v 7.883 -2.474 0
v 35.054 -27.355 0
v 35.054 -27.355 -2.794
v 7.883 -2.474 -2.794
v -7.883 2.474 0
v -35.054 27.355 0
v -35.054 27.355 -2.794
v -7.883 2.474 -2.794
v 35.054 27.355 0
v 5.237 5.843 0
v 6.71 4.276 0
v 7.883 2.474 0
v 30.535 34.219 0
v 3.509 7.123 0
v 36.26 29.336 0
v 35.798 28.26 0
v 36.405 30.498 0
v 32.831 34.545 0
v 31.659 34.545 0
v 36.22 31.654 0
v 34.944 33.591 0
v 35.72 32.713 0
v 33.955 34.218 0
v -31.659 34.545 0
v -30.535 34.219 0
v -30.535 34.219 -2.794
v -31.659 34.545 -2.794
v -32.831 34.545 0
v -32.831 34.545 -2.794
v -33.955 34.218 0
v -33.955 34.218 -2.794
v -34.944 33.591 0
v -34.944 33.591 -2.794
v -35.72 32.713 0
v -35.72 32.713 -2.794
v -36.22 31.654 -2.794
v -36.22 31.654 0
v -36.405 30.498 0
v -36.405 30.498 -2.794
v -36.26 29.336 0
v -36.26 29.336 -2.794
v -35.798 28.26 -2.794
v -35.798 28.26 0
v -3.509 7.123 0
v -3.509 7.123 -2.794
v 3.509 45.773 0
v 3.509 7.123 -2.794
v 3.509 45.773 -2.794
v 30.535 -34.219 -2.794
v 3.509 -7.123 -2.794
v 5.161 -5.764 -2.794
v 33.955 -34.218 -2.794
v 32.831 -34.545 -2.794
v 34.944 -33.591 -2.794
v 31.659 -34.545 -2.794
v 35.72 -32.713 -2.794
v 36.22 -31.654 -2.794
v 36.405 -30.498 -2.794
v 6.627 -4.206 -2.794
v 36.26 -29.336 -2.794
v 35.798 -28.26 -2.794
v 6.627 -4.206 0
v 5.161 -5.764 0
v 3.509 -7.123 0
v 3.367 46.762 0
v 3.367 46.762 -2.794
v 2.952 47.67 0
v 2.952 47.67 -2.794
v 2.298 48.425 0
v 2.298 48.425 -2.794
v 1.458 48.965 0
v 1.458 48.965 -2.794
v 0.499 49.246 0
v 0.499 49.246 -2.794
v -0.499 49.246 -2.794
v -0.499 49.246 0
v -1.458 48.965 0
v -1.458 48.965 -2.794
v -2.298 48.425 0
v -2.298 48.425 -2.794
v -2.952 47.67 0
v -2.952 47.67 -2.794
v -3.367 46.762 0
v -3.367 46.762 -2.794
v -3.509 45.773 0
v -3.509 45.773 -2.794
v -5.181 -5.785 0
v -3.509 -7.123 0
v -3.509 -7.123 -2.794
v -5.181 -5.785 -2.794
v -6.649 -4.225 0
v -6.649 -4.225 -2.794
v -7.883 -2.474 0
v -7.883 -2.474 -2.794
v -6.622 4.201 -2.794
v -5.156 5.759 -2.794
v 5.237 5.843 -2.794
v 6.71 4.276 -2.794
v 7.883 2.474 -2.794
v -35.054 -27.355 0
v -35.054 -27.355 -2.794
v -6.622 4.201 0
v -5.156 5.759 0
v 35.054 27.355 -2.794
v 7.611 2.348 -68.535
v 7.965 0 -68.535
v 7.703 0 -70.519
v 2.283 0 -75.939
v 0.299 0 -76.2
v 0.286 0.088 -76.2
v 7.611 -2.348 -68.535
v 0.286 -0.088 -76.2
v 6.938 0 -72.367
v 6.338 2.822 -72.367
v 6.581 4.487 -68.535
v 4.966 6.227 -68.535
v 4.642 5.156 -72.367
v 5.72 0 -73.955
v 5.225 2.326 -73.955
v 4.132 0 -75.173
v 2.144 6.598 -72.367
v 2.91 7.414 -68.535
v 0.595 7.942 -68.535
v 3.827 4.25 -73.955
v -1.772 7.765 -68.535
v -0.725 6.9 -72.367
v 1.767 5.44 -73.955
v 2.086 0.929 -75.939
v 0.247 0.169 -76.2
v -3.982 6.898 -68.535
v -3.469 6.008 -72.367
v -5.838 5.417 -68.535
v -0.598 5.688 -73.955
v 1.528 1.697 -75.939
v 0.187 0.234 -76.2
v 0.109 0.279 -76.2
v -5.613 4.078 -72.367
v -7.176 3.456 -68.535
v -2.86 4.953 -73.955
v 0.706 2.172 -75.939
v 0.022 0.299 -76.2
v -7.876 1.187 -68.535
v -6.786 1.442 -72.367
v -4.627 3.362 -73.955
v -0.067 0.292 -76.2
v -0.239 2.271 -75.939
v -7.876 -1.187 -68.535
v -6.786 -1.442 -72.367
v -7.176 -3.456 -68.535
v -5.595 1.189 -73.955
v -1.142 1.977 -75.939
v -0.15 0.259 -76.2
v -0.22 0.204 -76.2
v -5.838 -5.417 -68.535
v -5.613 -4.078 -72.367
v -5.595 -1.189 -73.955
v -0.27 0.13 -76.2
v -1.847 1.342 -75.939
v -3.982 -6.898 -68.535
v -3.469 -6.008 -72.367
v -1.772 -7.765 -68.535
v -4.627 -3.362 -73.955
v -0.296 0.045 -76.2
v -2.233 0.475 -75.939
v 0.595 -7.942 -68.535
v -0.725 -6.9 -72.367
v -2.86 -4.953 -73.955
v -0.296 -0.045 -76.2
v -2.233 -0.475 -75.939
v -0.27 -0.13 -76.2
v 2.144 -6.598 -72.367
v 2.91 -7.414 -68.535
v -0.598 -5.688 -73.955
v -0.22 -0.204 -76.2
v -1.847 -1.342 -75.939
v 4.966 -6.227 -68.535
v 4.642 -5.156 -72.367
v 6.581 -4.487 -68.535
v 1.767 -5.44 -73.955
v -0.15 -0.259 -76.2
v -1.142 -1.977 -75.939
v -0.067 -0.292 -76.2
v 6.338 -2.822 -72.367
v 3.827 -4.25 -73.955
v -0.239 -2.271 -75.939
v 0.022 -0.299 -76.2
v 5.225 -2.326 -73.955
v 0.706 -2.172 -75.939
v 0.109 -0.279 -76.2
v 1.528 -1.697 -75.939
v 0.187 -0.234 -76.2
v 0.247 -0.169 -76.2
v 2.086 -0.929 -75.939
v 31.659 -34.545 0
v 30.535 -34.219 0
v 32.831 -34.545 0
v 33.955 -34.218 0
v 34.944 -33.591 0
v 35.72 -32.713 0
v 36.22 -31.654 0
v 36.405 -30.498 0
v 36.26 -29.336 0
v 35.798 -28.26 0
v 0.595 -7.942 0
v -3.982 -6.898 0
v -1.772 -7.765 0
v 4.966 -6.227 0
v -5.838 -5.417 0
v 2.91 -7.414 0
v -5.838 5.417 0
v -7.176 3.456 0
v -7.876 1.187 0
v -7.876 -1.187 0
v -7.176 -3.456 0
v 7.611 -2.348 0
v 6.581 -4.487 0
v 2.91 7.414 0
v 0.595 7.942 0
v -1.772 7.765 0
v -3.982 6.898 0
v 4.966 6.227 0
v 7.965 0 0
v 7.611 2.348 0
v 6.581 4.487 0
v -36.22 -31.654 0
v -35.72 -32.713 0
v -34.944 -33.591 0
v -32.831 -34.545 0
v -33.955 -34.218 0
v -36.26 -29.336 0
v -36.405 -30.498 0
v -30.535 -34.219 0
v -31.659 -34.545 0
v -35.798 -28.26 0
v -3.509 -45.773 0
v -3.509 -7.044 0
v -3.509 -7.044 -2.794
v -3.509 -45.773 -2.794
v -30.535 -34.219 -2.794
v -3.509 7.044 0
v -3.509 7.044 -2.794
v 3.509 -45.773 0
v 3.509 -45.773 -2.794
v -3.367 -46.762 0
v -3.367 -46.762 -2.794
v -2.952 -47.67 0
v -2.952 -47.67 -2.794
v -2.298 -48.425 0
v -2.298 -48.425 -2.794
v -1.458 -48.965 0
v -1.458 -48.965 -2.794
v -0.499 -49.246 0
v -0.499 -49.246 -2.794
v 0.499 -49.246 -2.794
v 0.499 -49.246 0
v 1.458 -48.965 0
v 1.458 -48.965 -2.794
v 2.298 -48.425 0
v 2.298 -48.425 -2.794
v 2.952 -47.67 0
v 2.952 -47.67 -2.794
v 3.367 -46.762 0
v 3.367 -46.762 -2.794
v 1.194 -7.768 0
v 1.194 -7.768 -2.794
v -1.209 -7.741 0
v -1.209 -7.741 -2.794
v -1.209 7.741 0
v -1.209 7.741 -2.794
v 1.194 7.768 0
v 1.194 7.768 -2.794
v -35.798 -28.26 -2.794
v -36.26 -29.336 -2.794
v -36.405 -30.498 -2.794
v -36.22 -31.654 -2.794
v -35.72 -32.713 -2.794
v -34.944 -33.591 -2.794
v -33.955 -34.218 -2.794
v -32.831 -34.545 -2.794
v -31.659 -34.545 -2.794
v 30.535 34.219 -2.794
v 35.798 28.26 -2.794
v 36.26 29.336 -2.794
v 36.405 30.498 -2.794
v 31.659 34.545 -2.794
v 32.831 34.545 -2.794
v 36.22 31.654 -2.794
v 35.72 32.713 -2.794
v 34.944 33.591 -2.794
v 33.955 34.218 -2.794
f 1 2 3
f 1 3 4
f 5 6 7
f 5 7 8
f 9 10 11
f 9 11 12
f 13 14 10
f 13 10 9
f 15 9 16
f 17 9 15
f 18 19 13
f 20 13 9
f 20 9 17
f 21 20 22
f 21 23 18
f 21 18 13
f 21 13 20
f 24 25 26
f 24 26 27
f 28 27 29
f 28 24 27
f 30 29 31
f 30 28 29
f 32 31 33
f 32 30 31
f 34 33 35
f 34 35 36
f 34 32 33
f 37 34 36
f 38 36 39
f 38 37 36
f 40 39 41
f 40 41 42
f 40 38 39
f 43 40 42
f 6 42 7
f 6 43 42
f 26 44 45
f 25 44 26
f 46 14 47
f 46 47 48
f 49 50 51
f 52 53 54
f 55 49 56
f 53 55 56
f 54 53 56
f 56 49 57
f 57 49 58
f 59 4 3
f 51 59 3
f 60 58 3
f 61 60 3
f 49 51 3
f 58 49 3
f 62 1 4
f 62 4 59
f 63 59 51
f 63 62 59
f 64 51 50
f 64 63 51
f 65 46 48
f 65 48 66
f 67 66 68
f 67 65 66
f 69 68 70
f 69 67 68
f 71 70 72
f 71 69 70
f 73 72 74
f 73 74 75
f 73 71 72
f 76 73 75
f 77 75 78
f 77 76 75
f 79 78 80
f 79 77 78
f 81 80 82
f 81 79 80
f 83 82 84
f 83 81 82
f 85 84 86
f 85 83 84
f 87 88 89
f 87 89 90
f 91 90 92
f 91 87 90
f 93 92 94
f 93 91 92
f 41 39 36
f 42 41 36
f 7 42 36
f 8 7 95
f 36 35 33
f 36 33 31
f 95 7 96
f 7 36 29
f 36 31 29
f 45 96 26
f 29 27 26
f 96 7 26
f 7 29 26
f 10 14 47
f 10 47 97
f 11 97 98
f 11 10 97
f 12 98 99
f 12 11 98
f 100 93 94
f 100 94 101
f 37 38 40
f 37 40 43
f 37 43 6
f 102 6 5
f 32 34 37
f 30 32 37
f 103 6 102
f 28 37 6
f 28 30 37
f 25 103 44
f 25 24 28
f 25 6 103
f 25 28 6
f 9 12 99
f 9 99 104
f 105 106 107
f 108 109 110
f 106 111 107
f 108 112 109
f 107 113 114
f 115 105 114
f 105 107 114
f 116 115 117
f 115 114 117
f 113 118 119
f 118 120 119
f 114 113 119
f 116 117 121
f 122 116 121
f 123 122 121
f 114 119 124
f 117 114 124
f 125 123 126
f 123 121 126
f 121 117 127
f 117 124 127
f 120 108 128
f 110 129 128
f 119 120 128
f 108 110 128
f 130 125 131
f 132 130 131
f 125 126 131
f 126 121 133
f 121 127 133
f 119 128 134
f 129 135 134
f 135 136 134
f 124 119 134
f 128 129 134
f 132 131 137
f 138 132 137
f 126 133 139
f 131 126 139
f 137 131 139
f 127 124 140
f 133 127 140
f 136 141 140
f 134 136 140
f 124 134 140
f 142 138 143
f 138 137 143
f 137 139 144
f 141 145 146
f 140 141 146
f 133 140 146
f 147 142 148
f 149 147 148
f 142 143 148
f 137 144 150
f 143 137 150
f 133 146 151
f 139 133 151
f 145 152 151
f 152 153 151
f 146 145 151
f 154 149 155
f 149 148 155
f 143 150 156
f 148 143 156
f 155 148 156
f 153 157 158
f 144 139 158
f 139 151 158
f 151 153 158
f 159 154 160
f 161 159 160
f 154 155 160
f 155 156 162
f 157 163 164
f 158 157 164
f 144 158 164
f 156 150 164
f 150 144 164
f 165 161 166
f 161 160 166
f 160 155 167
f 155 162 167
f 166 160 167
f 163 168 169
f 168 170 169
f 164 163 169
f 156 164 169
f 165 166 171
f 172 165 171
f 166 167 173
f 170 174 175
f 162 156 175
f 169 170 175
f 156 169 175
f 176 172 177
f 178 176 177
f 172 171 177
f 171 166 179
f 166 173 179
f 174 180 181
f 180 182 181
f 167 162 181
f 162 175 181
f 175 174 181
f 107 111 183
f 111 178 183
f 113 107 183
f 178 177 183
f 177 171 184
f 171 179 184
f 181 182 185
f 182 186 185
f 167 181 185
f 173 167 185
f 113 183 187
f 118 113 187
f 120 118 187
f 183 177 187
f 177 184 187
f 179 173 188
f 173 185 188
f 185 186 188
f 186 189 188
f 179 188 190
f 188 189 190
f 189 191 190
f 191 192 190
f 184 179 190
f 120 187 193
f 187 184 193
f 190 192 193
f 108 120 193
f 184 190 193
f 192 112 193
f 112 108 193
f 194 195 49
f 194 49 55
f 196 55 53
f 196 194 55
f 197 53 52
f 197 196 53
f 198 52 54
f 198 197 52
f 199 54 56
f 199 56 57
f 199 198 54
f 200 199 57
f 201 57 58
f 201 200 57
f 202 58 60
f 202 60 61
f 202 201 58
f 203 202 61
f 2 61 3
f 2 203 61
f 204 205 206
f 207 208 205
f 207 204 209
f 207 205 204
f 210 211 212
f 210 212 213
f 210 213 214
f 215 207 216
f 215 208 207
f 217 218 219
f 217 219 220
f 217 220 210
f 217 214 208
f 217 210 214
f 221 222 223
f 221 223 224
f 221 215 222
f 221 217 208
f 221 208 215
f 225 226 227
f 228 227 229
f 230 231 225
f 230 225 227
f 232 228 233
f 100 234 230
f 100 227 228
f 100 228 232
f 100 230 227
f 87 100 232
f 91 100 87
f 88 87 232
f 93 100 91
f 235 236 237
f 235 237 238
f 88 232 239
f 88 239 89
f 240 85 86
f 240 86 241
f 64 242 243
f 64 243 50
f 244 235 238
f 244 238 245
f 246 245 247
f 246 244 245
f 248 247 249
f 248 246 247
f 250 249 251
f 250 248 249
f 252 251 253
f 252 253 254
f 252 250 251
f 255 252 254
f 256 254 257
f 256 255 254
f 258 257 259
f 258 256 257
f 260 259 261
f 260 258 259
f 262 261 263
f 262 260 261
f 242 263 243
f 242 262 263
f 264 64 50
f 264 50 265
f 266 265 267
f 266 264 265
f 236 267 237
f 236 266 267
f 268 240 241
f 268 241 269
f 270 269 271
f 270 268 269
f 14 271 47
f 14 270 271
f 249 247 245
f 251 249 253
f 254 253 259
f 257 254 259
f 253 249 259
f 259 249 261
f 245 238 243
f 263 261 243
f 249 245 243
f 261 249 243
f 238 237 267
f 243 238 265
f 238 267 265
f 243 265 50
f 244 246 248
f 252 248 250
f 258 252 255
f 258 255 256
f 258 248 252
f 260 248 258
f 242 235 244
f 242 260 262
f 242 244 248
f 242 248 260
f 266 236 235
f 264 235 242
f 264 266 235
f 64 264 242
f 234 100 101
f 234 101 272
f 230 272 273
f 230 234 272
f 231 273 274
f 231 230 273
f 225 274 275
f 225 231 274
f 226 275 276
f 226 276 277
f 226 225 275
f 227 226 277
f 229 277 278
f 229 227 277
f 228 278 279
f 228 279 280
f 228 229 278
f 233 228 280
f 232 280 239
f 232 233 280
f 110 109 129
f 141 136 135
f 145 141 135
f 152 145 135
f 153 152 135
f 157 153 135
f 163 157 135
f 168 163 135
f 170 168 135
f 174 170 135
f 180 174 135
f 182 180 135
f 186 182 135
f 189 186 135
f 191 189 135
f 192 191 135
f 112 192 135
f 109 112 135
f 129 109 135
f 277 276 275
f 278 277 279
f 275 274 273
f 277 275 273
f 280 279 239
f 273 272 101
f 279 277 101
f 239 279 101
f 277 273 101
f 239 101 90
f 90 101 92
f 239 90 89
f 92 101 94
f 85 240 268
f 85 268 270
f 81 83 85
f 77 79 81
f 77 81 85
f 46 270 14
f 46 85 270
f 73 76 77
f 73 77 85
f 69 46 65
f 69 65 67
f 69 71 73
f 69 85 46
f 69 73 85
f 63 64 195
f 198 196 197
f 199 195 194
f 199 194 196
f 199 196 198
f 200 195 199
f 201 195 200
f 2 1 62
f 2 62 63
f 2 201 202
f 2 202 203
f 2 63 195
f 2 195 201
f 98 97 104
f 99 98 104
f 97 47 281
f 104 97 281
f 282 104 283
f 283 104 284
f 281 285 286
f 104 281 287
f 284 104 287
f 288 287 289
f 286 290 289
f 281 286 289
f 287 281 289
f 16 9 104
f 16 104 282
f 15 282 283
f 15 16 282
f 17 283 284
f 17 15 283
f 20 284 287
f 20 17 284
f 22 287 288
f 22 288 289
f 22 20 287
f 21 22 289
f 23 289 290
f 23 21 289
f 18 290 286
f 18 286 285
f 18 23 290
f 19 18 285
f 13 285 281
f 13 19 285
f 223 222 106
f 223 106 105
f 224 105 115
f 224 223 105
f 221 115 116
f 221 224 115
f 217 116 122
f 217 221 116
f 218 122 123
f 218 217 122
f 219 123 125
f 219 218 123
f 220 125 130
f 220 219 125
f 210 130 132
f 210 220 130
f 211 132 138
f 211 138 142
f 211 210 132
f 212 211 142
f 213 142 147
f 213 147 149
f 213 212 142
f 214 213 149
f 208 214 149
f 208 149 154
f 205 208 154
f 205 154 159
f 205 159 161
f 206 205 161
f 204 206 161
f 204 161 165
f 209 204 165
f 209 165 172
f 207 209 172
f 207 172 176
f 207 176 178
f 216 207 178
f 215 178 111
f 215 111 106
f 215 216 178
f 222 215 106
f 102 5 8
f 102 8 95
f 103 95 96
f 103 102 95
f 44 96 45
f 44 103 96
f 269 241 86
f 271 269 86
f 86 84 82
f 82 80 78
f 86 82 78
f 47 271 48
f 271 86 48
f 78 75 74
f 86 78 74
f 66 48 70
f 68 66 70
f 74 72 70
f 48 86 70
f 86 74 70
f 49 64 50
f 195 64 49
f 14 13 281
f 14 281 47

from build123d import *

# Parameters (mm, degrees)
F0_R     = 7.9646104271
F1_DEPTH = 76.2
F3_DEPTH = 1.27
F4_DEPTH = 2.794
F5_R     = 7.6651280605


with BuildPart() as f1:
    # F0 (on Top) → F1 (new body)
    with BuildSketch(Plane.XY):
        Circle(F0_R)
    extrude(amount=-F1_DEPTH)

    # F5
    f5_edges = [f1.edges().sort_by_distance(p)[0] for p in [
        (-7.96461, 0, -76.2),
    ]]
    fillet(f5_edges, radius=F5_R)


with BuildPart() as f3:
    # F2 (on Top) → F3 (new body)
    with BuildSketch(Plane.XY):
        with BuildLine():
            Line((-3.5088843636, 7.1228999505), (-3.5088843636, 7.0438587708))
            ThreePointArc((-3.5088843636, 7.0438587708), (-0.0085166469, 7.8395403691), (3.5088843636, 7.1228999505))
            Line((3.5088843636, 7.1228999505), (3.5088843636, 45.7731597126))
            ThreePointArc((3.5088843636, 45.7731597126), (0, 49.2820440761), (-3.5088843636, 45.7731597126))
            Line((-3.5088843636, 45.7731597126), (-3.5088843636, 7.1228999505))
        make_face()
    extrude(amount=-F3_DEPTH)

    # F2 (on Top) → F4, piece 3 (join)
    with BuildSketch(Plane.XY):
        with BuildLine():
            Line((-3.5088843636, 7.1228999505), (-3.5088843636, 7.0438587708))
            ThreePointArc((-3.5088843636, 7.0438587708), (-0.0085166469, 7.8395403691), (3.5088843636, 7.1228999505))
            Line((3.5088843636, 7.1228999505), (3.5088843636, 45.7731597126))
            ThreePointArc((3.5088843636, 45.7731597126), (0, 49.2820440761), (-3.5088843636, 45.7731597126))
            Line((-3.5088843636, 45.7731597126), (-3.5088843636, 7.1228999505))
        make_face()
    extrude(amount=-F4_DEPTH)


with BuildPart() as f4:
    # F2 (on Top) → F4 (new body)
    with BuildSketch(Plane.XY):
        with BuildLine():
            ThreePointArc((-7.8832879663, 2.4740586523), (-5.9135126334, 5.0030703093), (-3.5088843636, 7.1228999505))
            Line((-3.5088843636, 7.1228999505), (-30.534560875, 34.2191336145))
            ThreePointArc((-30.534560875, 34.2191336145), (-35.7195475655, 32.7132669375), (-35.0542927591, 27.3551742292))
            Line((-35.0542927591, 27.3551742292), (-7.8832879663, 2.4740586523))
        make_face()
    extrude(amount=-F4_DEPTH)


with BuildPart() as f4b:
    # F2 (on Top) → F4, piece 2 (new body)
    with BuildSketch(Plane.XY):
        with BuildLine():
            Line((30.534560875, 34.2191336145), (3.5088843636, 7.1228999505))
            ThreePointArc((3.5088843636, 7.1228999505), (6.0083363832, 5.0922962748), (7.8832879663, 2.4740586523))
            Line((7.8832879663, 2.4740586523), (35.0542927591, 27.3551742292))
            ThreePointArc((35.0542927591, 27.3551742292), (35.7195475655, 32.7132669375), (30.534560875, 34.2191336145))
        make_face()
    extrude(amount=-F4_DEPTH)


with BuildPart() as f4c:
    # F2 (on Top) → F4, piece 4 (new body)
    with BuildSketch(Plane.XY):
        with BuildLine():
            ThreePointArc((3.5088843636, -7.1228999505), (-0.0085166469, -7.8395403691), (-3.5088843636, -7.0438587708))
            Line((-3.5088843636, -7.0438587708), (-3.5088843636, -7.1228999505))
            Line((-3.5088843636, -7.1228999505), (-3.5088843636, -45.7731597126))
            ThreePointArc((-3.5088843636, -45.7731597126), (0, -49.2820440761), (3.5088843636, -45.7731597126))
            Line((3.5088843636, -45.7731597126), (3.5088843636, -7.1228999505))
        make_face()
    extrude(amount=-F4_DEPTH)


with BuildPart() as f4d:
    # F2 (on Top) → F4, piece 5 (new body)
    with BuildSketch(Plane.XY):
        with BuildLine():
            ThreePointArc((7.8832879663, -2.4740586523), (5.9191100309, -5.0083372725), (3.5088843636, -7.1228999505))
            Line((3.5088843636, -7.1228999505), (30.534560875, -34.2191336145))
            ThreePointArc((30.534560875, -34.2191336145), (35.7195475655, -32.7132669375), (35.0542927591, -27.3551742292))
            Line((35.0542927591, -27.3551742292), (7.8832879663, -2.4740586523))
        make_face()
    extrude(amount=-F4_DEPTH)


with BuildPart() as f4e:
    # F2 (on Top) → F4, piece 6 (new body)
    with BuildSketch(Plane.XY):
        with BuildLine():
            Line((-30.534560875, -34.2191336145), (-3.5088843636, -7.1228999505))
            ThreePointArc((-3.5088843636, -7.1228999505), (-5.9425805218, -5.0304222166), (-7.8832879663, -2.4740586523))
            Line((-7.8832879663, -2.4740586523), (-35.0542927591, -27.3551742292))
            ThreePointArc((-35.0542927591, -27.3551742292), (-35.7195475655, -32.7132669375), (-30.534560875, -34.2191336145))
        make_face()
    extrude(amount=-F4_DEPTH)


solid = Compound([f1.part, f3.part, f4.part, f4b.part, f4c.part, f4d.part, f4e.part])
